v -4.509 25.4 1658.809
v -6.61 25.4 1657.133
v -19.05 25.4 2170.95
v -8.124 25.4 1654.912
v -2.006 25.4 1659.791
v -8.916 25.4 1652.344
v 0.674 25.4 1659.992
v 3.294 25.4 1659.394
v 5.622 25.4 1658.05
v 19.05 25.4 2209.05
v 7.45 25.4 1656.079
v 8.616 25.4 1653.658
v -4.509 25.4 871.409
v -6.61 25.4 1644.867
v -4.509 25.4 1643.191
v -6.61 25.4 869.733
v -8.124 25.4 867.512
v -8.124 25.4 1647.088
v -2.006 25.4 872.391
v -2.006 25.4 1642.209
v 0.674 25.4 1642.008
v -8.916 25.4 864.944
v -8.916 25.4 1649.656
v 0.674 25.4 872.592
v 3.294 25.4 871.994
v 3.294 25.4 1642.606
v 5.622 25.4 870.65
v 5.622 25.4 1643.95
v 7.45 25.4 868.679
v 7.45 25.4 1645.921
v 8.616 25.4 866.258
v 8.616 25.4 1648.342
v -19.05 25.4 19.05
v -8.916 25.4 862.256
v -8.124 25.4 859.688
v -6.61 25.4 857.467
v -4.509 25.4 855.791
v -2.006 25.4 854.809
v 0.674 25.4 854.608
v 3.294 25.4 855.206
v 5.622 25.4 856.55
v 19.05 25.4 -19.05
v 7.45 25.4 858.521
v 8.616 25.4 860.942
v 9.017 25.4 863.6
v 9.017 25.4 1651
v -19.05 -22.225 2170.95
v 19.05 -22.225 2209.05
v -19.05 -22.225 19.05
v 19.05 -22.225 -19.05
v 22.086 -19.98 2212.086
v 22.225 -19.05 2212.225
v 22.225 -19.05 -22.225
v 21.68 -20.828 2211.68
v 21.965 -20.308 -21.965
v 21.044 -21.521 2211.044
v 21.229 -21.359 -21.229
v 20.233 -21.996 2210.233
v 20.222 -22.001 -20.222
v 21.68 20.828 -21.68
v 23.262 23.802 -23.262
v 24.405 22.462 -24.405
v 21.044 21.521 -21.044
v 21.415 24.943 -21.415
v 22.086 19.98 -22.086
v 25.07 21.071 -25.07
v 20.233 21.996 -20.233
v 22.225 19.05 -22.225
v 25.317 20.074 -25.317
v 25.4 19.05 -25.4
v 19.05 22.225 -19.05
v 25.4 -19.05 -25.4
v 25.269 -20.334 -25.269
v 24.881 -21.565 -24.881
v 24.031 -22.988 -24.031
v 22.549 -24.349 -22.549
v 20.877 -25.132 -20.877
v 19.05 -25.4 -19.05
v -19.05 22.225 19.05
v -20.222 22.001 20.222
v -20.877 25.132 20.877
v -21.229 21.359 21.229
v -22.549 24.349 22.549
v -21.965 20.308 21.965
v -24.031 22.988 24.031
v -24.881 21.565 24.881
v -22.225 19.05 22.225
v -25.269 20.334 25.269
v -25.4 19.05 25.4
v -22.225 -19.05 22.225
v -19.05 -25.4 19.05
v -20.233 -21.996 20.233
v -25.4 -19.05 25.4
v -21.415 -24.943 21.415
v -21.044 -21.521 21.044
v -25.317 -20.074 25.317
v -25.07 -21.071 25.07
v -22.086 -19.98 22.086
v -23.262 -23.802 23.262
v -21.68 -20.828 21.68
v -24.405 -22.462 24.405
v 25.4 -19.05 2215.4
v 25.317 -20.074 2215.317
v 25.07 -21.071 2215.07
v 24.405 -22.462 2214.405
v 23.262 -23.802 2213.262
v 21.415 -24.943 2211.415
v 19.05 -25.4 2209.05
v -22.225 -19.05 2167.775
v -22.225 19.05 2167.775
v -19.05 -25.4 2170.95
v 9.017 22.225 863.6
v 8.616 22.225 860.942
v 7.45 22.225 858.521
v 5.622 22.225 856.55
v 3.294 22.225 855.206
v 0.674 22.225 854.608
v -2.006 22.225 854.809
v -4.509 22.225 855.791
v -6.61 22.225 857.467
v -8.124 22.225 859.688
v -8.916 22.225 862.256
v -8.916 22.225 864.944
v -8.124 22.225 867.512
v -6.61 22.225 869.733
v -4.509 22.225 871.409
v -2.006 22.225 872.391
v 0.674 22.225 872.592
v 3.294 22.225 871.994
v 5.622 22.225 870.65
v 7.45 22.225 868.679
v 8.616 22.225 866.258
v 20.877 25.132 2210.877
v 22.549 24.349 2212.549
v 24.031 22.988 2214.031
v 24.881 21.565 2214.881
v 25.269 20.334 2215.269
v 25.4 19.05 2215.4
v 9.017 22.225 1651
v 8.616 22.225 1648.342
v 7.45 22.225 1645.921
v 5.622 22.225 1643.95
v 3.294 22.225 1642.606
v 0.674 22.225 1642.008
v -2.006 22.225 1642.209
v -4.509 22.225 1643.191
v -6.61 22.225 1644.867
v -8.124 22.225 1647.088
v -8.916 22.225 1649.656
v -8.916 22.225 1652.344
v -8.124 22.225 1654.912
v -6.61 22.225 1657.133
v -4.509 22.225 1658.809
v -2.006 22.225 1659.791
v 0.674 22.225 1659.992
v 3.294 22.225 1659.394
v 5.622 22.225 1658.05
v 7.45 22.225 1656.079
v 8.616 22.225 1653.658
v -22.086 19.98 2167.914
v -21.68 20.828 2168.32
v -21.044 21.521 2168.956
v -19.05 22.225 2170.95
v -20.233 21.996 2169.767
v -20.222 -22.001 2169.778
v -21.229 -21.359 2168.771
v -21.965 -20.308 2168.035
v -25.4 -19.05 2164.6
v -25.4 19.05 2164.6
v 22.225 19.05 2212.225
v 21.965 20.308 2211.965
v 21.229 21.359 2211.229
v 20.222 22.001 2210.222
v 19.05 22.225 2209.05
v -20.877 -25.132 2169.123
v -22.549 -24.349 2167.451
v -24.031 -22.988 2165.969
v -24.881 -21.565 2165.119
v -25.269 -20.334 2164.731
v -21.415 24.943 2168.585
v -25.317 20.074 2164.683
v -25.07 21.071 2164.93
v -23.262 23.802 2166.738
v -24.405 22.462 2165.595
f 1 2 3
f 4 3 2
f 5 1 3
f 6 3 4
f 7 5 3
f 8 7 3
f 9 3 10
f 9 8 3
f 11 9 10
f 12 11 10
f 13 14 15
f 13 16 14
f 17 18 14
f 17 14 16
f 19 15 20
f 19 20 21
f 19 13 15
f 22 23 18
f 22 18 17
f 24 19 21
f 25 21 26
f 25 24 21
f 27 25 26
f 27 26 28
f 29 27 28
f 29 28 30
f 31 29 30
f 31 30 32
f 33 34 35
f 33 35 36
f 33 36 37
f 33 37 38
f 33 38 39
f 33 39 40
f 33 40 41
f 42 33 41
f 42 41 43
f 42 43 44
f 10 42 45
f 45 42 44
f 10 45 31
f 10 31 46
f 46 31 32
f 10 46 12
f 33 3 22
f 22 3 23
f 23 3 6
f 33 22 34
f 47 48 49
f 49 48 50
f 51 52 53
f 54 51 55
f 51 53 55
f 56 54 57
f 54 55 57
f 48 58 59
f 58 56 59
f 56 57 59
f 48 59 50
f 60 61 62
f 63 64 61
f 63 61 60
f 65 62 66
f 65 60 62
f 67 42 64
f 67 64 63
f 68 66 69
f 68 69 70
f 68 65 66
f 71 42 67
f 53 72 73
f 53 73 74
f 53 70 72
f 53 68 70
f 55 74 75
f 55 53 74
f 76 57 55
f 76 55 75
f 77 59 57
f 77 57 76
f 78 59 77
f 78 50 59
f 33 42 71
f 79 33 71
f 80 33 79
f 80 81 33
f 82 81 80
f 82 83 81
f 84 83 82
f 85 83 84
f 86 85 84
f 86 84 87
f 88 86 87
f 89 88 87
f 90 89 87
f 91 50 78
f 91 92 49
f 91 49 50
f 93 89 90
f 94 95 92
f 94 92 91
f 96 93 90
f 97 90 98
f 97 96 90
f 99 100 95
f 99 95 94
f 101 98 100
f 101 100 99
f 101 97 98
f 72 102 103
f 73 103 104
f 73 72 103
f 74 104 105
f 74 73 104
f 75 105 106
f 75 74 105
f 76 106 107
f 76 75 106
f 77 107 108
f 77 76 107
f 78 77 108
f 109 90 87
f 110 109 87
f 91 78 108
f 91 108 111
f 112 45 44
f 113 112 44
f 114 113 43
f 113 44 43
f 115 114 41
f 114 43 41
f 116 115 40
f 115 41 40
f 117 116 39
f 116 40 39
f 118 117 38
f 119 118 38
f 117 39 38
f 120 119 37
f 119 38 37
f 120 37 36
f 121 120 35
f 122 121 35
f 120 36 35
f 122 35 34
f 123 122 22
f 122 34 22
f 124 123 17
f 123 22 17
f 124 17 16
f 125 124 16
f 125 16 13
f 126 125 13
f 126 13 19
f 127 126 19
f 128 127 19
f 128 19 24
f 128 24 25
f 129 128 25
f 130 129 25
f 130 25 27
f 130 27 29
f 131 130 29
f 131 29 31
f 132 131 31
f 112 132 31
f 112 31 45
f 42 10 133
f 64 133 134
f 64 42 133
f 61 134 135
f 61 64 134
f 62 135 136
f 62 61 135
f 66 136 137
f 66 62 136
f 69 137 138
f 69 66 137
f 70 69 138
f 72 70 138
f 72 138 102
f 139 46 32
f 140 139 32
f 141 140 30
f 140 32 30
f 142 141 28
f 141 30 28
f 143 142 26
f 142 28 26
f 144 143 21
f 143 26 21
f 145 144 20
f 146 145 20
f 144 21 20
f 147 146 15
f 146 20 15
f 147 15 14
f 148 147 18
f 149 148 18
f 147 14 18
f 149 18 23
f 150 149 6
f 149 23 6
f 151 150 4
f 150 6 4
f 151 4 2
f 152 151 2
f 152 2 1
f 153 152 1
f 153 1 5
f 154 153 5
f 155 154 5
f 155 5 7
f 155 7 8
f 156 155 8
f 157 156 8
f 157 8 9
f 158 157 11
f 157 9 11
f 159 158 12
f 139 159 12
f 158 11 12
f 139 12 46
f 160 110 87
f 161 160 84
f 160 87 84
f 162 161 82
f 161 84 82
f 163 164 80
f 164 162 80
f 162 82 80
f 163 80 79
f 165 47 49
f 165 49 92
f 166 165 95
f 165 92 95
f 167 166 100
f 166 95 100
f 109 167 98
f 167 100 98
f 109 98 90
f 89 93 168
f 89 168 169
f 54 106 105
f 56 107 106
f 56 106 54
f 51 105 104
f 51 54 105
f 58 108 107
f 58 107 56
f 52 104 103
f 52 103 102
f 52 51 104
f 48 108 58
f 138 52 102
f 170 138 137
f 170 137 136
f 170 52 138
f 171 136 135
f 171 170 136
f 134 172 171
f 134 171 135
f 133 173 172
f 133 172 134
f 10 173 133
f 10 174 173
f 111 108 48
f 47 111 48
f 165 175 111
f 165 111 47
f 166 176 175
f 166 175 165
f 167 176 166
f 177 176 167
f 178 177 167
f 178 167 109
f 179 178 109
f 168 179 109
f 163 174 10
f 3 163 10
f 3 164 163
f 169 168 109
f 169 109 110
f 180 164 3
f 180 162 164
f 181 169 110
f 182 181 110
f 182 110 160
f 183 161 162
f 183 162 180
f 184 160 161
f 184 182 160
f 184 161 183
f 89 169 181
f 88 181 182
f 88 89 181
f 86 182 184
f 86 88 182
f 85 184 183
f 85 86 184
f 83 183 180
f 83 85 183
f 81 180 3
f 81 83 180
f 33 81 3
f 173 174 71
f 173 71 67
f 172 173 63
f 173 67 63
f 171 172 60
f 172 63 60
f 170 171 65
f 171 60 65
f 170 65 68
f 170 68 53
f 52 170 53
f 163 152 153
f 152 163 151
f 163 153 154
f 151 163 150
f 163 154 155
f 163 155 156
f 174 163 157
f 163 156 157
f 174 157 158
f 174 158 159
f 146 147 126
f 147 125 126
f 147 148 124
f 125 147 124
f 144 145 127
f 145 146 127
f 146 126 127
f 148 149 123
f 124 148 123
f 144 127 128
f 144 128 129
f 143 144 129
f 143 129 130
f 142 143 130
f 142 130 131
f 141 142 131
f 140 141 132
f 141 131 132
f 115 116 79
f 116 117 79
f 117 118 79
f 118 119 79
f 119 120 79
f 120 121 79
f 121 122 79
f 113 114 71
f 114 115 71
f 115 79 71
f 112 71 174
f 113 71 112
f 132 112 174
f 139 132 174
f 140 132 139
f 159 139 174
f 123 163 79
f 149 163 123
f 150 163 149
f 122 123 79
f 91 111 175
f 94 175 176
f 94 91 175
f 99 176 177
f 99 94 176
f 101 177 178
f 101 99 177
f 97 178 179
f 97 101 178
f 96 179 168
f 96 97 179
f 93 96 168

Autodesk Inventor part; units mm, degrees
ref_plane "Plano inicial" through (0, 0, -25.4) normal (0, 0, 1) x (1, 0, 0)
ref_plane "Plano final" through (0, 0, 2215.4) normal (0, 0, 1) x (1, 0, 0)
sketch "Boceto" plane through (0, 0, 0) normal (0, 0, 1) x (1, 0, 0)
  line L0 (-25.4, -19.05) -> (-25.4, 19.05)
  line L1 (-19.05, 25.4) -> (19.05, 25.4)
  line L2 (25.4, 19.05) -> (25.4, -19.05)
  line L3 (19.05, -25.4) -> (-19.05, -25.4)
  arc A0 (-25.4, -19.05) -> (-19.05, -25.4) centre (-19.05, -19.05) ccw
  arc A1 (-19.05, 25.4) -> (-25.4, 19.05) centre (-19.05, 19.05) ccw
  arc A2 (25.4, 19.05) -> (19.05, 25.4) centre (19.05, 19.05) ccw
  arc A3 (19.05, -25.4) -> (25.4, -19.05) centre (19.05, -19.05) ccw
  arc A4 (-19.05, 22.225) -> (-22.225, 19.05) centre (-19.05, 19.05) ccw
  line L4 (-19.05, 22.225) -> (19.05, 22.225)
  arc A5 (22.225, 19.05) -> (19.05, 22.225) centre (19.05, 19.05) ccw
  line L5 (22.225, 19.05) -> (22.225, -19.05)
  arc A6 (19.05, -22.225) -> (22.225, -19.05) centre (19.05, -19.05) ccw
  line L6 (19.05, -22.225) -> (-19.05, -22.225)
  arc A7 (-22.225, -19.05) -> (-19.05, -22.225) centre (-19.05, -19.05) ccw
  line L7 (-22.225, -19.05) -> (-22.225, 19.05)
  line L8 (0, 37.4012) -> (0, -37.4012) construction
  line L9 (-37.4012, 0) -> (37.4012, 0) construction
  dimension "d10" = 50.8
  dimension "d11" = 50.8
  dimension "d12" = 3.175
  dimension "d15" = 25.4
  dimension "d16" = 25.4
  dimension "d17" = 6.35
extrude "Cuerpo" add sketch "Boceto" along normal up to surface (2240.8 mm away) from surface at -25.4
sketch "Sketch3" plane through (0, 0, 0) normal (0, 0, 1) x (1, 0, 0)
  line L0 (0, 0) -> (10, 0)
ref_plane "Work Plane3" through (0, 0, 0) normal (0, -1, 0) x (1, 0, 0)
ref_plane "Plano de trabajo4" through (25.4, 0, -25.4) normal (-0.7071, 0, -0.7071) x (-0.7071, 0, 0.7071)
split "Dividir1" plane through (25.4, 0, -25.4) removes the side toward (-0.7071, 0, -0.7071)
ref_plane "Plano de trabajo5" through (25.4, 0, 2215.4) normal (-0.7071, 0, 0.7071) x (0.7071, 0, 0.7071)
split "Dividir2" plane through (25.4, 0, 2215.4) removes the side toward (-0.7071, 0, 0.7071)
sketch "Boceto5" plane through (19.05, 25.4, 2209.05) normal (0, 1, 0) x (1, 0, 0)
  line L0 (-19.05, 2209.05) -> (-19.05, 19.05)
  line L1 (-38.1, 38.1) -> (0, 0) projected
  circle A0 centre (-19.05, 1345.45) radius 9.017
  circle A1 centre (-19.05, 558.05) radius 9.017
  line L2 (0, 2228.1) -> (-38.1, 2190) projected
  circle A2 centre (-19.05, 2113.9013) radius 8.4404
  point P0 (-19.05, 2209.05)
  point P1 (-19.05, 2209.05)
  point P2 (-19.05, 2209.05)
  dimension "d20" = 18.034
  dimension "d21" = 18.034
  dimension "d22" = 863.6
  dimension "d23" = 1651
  dimension "d26" = 95.1487
extrude "Extrusión2" cut sketch "Boceto5" against normal blind 6.35 contours A1 L0 | L0 A1 | A0 L0 | L0 A0
sketch "Sketch4" plane through (0, 0, 0) normal (0, -1, 0) x (1, 0, 0)
  line L0 (-2, -25.4) -> (12, -25.4) projected
  line L1 (-2, 2215.4) -> (12, 2215.4) projected
  dimension "d19" = 2240.8
equation "\"d10\" = G_H"
equation "\"d11\" = G_W"
equation "\"d12\" = G_T"
equation "\"d15\" = 0.5 * d10"
equation "\"d16\" = 0.5 * d11"
equation "\"d17\" = G_IR"
equation "\"d3\" = G_L"
equation "\"G_W\" = 50.8"
equation "\"G_H\" = 50.8"
equation "\"G_T\" = 3.175"
equation "\"G_IR\" = 6.35"
equation "\"G_L\" = d19"
equation "\"G_OFFSET_START\" = 25.4"
equation "\"G_OFFSET_END\" = 25.4"
equation "\"d13\" = -G_OFFSET_START"
equation "\"d14\" = G_OFFSET_END + B_L"
equation "\"B_L\" = 2190"
properties part number "AISC - 2 x 2 x 1/8 - 88,22" material "Acero, suave"
